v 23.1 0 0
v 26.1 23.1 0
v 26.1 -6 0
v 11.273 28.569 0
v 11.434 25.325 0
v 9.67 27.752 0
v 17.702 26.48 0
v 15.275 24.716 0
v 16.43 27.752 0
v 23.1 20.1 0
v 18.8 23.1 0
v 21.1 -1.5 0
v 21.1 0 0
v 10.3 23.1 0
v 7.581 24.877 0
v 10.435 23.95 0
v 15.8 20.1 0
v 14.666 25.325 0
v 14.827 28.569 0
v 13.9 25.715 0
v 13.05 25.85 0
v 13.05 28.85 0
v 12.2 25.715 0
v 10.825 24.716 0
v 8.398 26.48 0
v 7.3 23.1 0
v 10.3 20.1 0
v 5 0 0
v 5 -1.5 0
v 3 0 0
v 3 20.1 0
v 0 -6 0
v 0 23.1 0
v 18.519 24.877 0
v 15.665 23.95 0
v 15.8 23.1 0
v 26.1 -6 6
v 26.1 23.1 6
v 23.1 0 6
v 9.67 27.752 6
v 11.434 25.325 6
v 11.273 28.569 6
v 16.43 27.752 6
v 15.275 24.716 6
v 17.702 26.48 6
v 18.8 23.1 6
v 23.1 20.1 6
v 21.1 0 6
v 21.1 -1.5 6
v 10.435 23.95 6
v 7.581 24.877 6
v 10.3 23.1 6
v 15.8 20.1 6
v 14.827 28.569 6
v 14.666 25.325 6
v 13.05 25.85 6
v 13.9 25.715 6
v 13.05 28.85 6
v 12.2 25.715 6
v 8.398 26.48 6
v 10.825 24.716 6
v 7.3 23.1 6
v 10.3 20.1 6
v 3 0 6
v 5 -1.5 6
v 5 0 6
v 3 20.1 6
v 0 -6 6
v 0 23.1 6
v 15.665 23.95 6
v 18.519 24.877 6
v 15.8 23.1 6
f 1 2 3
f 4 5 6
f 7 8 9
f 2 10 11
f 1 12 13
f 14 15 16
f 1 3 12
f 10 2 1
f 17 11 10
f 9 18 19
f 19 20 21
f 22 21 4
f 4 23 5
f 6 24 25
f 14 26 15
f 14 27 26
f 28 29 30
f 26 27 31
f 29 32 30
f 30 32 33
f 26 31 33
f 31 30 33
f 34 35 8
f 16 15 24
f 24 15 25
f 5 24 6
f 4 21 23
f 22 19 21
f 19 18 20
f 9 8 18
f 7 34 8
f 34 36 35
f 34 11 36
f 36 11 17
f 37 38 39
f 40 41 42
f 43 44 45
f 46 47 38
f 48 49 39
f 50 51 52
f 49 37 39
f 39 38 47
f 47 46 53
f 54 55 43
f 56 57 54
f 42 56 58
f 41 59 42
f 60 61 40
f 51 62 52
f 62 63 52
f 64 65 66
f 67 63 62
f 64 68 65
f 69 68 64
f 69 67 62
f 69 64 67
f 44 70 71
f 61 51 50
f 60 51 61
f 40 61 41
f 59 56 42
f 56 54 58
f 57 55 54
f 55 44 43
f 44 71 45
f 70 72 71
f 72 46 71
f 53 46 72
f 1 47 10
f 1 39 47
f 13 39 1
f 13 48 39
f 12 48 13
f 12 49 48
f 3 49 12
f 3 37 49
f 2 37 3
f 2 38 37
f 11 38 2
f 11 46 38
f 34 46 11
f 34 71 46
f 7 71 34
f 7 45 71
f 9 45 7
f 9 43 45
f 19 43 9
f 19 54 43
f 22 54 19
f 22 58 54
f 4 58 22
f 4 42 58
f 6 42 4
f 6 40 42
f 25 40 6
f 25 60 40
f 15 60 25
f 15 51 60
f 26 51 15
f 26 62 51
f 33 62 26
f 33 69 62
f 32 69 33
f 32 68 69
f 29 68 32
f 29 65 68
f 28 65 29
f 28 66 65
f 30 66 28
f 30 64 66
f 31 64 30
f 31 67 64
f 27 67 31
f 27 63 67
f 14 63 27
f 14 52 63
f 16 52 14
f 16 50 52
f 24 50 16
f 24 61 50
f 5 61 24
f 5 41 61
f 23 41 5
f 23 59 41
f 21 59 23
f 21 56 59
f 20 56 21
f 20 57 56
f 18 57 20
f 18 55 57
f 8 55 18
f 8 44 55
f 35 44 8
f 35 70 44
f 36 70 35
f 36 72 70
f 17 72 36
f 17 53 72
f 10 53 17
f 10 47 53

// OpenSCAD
thickness = 3;
teeth_engage=2;
major_dim = 20.1;
coax_hole = 5.5;

extendo = 0;

linear_extrude(height=6) union() {
    difference() {
      square([major_dim + 2*thickness, major_dim + thickness]);
      translate([thickness, 0, 0]) square([major_dim, major_dim]);
      translate([major_dim/2 + thickness - coax_hole/2, major_dim, 0]) square([coax_hole, thickness]);
    }

    polygon([[0, 0], [thickness + teeth_engage, 0], [thickness + teeth_engage, -0.5*thickness], [0, -2*thickness]]);

    polygon([[major_dim + 2*thickness, 0], [(major_dim + 2*thickness) - thickness - teeth_engage, 0], [(major_dim + 2*thickness) - thickness - teeth_engage, -0.5*thickness], [major_dim + 2*thickness, -2*thickness]]);

    translate([major_dim/2 + thickness, extendo + major_dim+thickness, 0]) difference() {
        circle(d=coax_hole + 2*thickness, $fn = 20);
        circle(d=coax_hole, $fn = 20);
        translate([-(coax_hole + 2*thickness)/2, -2 *thickness]) square([coax_hole + 2*thickness, 2*thickness]);
    }
    
    translate([major_dim/2 - coax_hole/2, major_dim+thickness, 0])square([thickness, extendo]);
    
    translate([major_dim/2 + coax_hole/2 + thickness, major_dim+thickness, 0])square([thickness, extendo]);
}
